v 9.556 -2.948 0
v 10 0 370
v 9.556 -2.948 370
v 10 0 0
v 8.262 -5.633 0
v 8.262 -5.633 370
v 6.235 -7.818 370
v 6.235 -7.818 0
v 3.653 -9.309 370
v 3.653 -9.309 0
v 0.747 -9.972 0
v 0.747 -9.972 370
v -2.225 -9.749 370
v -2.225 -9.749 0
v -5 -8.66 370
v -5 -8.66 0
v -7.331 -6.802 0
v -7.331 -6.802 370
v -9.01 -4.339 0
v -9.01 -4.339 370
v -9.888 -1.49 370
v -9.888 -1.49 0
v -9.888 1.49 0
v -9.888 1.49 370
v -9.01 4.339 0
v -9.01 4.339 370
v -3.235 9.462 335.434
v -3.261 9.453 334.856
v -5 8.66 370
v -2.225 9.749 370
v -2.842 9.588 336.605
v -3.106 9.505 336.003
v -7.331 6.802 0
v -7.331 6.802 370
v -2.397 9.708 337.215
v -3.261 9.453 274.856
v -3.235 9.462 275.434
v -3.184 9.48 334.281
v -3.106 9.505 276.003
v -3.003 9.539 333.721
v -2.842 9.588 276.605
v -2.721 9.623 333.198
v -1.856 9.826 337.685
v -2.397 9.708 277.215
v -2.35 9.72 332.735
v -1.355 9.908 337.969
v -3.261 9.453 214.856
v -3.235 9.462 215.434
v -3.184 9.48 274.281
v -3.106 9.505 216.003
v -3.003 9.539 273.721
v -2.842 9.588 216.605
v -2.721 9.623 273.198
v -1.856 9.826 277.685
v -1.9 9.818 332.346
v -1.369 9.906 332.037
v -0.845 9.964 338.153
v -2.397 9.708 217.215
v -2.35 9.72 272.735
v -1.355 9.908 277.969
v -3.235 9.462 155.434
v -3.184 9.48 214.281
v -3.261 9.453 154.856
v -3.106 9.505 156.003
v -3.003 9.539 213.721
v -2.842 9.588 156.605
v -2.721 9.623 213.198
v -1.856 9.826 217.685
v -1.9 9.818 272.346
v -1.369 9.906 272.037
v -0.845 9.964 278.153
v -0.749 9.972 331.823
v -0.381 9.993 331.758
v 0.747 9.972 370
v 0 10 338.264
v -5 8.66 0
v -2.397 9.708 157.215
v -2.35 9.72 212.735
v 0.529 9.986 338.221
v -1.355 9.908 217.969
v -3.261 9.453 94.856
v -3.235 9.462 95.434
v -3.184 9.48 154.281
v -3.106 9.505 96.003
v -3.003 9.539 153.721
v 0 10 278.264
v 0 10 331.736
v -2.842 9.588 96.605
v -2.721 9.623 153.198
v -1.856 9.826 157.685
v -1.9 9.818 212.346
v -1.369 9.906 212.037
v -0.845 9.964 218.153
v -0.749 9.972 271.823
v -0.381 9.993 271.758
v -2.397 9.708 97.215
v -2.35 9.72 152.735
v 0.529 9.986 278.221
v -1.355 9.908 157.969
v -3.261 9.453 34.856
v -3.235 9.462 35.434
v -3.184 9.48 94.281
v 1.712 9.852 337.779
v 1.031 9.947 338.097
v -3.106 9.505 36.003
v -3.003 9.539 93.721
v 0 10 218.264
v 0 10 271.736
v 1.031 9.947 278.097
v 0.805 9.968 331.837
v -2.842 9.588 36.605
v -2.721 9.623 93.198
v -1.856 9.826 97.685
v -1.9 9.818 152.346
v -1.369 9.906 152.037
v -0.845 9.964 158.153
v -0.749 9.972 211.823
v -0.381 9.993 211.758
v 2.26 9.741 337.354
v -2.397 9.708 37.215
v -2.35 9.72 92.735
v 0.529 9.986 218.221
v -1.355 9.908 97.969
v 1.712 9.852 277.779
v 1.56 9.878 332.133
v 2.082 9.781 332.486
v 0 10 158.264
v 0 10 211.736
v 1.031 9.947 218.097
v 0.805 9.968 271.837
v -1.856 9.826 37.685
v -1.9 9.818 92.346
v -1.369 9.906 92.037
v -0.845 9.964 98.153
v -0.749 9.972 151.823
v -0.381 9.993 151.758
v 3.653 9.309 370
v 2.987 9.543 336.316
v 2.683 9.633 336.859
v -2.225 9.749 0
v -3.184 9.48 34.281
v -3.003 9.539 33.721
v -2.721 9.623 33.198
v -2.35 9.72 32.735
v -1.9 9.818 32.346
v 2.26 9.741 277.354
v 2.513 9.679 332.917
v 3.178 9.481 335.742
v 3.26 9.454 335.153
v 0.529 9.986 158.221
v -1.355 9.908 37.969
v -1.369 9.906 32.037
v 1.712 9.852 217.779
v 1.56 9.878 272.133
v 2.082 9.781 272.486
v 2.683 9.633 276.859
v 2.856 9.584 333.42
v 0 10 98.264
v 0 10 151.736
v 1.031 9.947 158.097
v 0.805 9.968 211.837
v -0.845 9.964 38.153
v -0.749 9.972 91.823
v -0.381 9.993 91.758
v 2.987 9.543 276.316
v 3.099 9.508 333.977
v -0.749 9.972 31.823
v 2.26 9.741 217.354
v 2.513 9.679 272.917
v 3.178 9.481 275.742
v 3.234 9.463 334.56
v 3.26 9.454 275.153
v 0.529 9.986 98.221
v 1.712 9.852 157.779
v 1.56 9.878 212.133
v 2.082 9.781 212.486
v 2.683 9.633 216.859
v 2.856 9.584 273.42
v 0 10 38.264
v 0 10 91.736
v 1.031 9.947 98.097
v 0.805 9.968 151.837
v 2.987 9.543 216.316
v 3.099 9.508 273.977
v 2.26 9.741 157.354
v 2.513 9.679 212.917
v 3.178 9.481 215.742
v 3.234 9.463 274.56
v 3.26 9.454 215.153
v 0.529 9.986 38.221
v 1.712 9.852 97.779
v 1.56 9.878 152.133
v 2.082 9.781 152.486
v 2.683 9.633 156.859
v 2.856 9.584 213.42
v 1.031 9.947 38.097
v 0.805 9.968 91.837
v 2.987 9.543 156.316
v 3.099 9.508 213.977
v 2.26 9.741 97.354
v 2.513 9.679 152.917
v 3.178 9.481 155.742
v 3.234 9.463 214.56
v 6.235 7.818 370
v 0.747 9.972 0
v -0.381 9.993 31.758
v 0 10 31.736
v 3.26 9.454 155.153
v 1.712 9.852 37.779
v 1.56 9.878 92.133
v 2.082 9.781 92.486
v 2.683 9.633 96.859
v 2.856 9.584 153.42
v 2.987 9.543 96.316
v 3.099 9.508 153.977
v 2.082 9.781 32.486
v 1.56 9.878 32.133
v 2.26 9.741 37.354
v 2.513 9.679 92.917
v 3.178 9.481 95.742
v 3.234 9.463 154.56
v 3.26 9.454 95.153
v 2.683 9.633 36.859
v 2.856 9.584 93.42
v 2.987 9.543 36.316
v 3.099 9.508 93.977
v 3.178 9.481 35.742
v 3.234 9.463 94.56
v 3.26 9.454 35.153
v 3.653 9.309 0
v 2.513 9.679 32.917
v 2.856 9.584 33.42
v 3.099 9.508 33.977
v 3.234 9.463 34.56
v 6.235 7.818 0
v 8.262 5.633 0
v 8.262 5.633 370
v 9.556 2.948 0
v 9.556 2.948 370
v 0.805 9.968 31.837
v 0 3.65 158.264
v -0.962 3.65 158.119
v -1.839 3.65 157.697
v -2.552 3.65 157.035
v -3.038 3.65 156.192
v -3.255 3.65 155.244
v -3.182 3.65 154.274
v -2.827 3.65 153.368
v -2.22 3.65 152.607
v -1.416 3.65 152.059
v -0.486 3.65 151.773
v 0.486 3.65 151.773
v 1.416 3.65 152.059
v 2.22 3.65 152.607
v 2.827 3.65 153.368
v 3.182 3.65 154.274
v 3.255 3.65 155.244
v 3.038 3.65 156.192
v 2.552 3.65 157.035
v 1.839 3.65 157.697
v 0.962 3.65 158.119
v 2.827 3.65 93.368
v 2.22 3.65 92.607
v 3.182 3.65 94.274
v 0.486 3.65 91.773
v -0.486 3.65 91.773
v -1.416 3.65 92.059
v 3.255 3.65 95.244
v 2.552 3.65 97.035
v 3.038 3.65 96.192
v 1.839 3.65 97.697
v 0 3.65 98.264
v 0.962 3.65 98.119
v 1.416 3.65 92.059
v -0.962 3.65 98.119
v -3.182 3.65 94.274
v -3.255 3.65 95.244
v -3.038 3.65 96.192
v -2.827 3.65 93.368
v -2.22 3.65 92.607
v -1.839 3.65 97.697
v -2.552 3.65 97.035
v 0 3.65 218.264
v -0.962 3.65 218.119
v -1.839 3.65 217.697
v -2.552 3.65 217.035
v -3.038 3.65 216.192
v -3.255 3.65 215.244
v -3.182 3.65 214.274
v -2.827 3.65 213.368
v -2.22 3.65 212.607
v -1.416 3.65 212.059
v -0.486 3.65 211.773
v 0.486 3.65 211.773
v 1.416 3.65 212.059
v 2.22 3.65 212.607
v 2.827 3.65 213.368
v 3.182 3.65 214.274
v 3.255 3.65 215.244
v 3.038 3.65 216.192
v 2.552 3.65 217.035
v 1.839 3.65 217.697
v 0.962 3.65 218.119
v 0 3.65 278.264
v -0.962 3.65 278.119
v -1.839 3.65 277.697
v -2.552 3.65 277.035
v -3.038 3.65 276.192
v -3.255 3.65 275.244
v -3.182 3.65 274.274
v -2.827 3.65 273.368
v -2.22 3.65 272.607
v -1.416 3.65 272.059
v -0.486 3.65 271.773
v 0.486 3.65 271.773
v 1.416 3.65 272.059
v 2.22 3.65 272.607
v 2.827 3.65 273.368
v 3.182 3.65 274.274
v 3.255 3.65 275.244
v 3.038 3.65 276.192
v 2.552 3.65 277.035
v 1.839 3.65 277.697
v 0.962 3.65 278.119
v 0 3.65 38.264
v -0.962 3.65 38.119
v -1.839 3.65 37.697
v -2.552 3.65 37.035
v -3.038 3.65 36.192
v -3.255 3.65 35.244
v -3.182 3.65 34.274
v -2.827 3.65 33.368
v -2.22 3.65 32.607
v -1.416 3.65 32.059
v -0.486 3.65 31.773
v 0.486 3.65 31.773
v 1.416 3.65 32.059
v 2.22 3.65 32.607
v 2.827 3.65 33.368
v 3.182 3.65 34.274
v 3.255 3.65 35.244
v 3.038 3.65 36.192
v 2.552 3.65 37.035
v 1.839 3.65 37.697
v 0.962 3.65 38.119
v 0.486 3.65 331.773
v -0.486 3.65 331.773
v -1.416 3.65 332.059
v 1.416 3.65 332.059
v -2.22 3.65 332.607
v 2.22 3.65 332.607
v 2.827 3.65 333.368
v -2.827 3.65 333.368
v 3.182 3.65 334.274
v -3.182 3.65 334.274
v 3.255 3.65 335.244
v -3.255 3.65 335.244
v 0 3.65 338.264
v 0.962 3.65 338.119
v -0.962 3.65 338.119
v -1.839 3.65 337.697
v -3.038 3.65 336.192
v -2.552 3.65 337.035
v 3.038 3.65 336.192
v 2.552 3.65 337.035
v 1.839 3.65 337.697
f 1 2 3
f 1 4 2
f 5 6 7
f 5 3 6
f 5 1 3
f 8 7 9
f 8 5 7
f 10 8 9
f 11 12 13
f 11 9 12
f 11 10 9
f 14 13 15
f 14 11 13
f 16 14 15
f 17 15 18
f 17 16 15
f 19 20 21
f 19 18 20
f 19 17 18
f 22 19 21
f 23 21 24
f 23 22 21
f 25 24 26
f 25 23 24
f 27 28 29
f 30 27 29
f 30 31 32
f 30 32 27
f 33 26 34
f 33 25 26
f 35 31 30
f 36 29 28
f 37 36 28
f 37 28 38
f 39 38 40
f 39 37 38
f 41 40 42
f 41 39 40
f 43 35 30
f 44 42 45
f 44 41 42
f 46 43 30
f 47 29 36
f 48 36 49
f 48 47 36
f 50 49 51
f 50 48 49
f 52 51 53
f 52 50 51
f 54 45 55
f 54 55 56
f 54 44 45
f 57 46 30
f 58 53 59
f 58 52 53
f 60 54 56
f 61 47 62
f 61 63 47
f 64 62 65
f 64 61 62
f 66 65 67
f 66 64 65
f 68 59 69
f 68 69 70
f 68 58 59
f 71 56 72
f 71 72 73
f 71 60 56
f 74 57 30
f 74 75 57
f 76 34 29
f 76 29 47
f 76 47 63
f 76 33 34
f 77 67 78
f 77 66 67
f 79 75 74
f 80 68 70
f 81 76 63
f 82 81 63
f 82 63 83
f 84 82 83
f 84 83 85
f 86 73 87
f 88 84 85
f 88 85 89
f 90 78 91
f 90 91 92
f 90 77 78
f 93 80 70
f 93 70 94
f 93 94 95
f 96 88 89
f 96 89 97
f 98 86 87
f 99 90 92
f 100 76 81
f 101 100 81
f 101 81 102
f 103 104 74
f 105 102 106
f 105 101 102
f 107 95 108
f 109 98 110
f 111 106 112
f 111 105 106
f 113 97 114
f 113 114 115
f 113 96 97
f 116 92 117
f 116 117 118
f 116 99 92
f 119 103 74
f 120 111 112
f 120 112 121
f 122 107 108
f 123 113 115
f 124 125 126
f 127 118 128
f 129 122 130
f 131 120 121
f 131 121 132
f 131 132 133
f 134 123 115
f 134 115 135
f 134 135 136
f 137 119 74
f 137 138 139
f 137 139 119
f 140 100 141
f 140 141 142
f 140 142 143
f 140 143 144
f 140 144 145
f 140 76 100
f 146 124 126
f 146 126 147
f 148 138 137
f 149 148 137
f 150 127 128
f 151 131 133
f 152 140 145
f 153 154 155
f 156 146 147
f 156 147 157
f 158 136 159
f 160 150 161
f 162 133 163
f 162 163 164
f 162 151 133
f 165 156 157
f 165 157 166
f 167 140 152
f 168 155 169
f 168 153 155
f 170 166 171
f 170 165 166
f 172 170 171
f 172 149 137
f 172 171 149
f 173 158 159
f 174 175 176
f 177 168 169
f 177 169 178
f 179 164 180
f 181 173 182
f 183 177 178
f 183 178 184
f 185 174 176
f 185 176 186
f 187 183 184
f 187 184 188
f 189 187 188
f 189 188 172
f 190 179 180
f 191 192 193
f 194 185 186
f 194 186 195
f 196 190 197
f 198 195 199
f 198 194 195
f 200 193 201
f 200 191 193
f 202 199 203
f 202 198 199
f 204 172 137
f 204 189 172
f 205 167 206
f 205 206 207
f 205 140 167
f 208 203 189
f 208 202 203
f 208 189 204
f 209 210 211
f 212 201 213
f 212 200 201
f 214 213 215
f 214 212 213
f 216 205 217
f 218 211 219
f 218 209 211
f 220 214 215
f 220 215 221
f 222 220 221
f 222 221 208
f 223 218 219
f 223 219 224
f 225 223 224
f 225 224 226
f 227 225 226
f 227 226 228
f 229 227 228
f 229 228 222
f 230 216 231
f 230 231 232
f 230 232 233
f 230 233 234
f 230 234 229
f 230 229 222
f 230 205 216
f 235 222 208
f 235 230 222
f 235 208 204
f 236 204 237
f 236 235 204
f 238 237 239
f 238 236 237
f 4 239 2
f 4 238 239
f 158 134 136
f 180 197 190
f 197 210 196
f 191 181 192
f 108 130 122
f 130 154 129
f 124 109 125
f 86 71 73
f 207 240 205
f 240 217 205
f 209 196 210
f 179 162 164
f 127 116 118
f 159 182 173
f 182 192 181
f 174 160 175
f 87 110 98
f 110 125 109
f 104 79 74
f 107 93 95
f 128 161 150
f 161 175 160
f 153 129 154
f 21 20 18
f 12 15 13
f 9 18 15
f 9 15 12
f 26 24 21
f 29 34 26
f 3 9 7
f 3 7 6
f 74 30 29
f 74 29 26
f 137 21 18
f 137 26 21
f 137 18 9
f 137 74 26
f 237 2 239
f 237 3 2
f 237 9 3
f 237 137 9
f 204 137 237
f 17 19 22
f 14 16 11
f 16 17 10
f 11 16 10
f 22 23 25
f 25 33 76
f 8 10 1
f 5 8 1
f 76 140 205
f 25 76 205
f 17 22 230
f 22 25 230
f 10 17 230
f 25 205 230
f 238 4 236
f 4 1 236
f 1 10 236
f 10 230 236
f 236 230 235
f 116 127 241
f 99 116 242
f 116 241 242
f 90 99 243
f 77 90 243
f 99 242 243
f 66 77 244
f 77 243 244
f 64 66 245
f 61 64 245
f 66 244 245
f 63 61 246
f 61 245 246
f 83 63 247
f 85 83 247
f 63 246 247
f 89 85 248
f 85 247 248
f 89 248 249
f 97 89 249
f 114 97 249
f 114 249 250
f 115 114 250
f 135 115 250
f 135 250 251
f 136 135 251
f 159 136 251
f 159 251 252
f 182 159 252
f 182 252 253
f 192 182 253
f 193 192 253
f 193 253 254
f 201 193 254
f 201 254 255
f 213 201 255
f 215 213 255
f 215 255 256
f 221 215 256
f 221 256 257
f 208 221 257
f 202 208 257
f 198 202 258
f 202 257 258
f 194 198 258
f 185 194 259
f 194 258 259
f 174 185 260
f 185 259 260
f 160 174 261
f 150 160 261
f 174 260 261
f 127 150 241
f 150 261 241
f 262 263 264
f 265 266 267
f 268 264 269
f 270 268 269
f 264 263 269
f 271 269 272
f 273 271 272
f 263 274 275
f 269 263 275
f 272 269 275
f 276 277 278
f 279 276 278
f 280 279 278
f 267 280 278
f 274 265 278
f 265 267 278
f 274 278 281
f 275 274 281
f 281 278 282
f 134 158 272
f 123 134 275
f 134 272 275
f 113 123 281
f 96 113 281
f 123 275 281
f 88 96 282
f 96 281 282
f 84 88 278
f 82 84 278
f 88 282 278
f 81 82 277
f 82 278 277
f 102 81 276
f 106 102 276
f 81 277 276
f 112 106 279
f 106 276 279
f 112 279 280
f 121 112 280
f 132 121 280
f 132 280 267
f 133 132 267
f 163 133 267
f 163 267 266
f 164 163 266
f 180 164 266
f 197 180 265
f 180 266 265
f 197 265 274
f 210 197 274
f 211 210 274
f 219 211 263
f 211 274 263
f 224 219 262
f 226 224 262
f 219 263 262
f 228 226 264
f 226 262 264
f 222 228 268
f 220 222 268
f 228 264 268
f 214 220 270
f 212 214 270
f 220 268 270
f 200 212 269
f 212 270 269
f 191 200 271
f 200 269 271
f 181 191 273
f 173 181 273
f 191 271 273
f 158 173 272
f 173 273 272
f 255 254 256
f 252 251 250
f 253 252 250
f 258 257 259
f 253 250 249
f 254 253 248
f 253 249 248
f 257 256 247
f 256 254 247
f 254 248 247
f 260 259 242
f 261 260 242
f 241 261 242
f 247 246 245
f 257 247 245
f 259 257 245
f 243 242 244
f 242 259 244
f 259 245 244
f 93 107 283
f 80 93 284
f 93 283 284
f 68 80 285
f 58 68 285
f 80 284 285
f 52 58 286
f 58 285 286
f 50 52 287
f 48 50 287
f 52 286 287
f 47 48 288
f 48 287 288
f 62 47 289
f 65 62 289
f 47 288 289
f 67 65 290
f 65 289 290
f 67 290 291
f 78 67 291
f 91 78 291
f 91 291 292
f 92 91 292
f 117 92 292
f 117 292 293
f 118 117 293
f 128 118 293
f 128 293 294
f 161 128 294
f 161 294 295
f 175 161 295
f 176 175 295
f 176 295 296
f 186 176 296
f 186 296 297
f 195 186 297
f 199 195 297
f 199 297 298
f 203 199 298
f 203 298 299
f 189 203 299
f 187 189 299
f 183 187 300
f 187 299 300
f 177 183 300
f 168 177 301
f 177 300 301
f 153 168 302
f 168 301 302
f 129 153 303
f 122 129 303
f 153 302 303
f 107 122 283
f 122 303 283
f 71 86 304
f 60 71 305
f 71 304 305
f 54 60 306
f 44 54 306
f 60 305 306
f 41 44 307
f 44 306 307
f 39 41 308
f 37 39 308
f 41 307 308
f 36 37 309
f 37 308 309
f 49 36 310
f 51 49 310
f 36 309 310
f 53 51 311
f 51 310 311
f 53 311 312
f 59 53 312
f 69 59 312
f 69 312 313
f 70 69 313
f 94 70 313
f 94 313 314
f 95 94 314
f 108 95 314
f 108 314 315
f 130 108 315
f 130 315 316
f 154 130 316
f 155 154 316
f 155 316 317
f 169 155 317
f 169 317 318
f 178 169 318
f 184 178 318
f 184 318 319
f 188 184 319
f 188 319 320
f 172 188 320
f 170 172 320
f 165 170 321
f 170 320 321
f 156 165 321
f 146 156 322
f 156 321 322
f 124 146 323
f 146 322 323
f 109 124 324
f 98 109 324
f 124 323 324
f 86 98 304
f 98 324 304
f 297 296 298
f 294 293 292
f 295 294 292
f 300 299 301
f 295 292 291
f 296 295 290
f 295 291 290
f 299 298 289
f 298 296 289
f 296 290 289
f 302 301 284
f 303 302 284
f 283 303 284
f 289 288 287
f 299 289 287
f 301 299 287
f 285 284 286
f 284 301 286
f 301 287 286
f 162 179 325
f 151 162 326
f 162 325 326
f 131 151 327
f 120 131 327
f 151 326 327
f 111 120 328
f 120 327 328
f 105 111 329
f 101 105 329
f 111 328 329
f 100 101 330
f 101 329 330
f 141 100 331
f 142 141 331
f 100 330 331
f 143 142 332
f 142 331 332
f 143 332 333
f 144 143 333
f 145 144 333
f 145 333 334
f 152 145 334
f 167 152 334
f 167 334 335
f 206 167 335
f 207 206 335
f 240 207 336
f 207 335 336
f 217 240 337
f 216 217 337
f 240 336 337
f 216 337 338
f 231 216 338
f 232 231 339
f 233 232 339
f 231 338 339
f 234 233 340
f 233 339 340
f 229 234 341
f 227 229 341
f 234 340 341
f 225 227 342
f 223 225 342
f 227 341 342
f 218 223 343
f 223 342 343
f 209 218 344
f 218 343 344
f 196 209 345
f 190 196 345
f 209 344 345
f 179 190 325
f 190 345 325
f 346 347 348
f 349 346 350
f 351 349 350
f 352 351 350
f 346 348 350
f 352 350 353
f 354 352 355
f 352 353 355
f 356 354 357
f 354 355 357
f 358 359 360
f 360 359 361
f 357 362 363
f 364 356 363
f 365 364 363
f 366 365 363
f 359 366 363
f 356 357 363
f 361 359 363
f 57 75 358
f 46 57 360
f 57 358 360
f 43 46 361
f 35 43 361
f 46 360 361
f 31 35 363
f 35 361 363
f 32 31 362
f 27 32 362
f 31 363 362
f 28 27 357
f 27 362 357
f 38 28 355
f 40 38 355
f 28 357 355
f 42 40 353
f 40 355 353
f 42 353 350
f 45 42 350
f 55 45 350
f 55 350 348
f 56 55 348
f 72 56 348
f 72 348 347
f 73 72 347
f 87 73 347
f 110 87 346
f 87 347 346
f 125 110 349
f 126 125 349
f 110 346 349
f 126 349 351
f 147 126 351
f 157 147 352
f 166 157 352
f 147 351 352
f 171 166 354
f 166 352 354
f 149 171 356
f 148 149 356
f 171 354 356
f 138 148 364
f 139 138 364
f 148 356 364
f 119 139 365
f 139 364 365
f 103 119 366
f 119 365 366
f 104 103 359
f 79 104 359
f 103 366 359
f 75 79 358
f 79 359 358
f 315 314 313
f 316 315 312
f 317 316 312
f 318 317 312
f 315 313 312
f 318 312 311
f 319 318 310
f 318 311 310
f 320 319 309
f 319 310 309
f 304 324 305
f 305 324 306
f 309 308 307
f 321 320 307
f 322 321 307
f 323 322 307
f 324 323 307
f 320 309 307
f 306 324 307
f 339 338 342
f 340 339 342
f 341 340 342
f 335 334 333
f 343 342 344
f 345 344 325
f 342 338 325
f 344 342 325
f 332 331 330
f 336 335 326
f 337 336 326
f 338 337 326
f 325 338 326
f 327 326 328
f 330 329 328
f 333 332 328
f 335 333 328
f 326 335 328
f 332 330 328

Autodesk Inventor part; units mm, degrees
ref_plane "YZ Plane" through (0, 0, 0) normal (1, 0, 0) x (0, 1, 0)
ref_plane "XZ Plane" through (0, 0, 0) normal (0, 1, 0) x (-1, 0, 0)
sketch "Sketch1" plane through (0, 0, 0) normal (0, 0, 1) x (1, 0, 0)
  circle A0 centre (0, 0) radius 10
  dimension "d0" = 20
extrude "Extrusion1" add sketch "Sketch1" along normal blind 370
sketch "Sketch2" plane through (0, 0, 370) normal (0, 0, 1) x (1, 0, 0)
  circle A0 centre (0, 0) radius 10 projected
  point P0 (0, 10)
ref_plane "Work Plane1" through (0, 10, 370) normal (0, 1, 0) x (-1, 0, 0)
sketch "Sketch3" plane through (0, 10, 370) normal (0, 1, 0) x (-1, 0, 0)
  line L0 (10, 0) -> (-10, 0) projected
  line L1 (0, 0) -> (0, -7.8686) construction
  point P0 (0, -370)
  point P1 (0, -35)
  point P2 (0, -95)
  point P3 (0, -155)
  point P4 (0, -215)
  point P5 (0, -275)
  point P6 (0, -335)
  dimension "d3" = 35
  dimension "d6" = 60
hole "Hole1" at (0, 10, 335) at (0, 10, 275) at (0, 10, 215) at (0, 10, 155) at (0, 10, 95) at (0, 10, 35) direction (0, -1, 0) diameter 6.5278 depth 6.35
properties part number "diy-rail_370mm"
